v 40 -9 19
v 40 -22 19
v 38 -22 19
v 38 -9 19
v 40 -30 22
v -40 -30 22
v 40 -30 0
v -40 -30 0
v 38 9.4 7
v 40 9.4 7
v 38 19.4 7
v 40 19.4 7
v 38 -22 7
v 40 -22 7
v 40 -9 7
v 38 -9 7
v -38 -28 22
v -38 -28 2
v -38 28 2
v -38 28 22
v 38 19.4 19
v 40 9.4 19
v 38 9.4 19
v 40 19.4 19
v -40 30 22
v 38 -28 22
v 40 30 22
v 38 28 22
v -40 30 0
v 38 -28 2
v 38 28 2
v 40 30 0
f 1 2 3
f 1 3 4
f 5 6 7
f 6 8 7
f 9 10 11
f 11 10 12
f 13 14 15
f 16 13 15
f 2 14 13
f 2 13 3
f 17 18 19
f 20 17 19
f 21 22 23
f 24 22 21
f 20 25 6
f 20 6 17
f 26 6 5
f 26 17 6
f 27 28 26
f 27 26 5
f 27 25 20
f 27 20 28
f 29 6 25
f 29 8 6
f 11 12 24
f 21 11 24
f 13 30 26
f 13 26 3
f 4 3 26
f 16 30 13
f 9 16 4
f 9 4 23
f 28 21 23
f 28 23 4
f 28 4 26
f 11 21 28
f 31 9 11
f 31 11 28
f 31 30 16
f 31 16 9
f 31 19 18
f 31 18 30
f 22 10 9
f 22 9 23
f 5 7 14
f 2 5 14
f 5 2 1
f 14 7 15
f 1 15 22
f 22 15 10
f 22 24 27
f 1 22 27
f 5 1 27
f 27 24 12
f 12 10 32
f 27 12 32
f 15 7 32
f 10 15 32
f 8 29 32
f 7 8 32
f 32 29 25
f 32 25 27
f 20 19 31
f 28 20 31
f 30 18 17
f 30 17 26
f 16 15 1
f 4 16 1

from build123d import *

# Parameters (mm, degrees)
F0_W     = 80
F0_H     = 60
F1_DEPTH = 2
F2_W     = 80
F2_H     = 60
F2_W_2   = 76
F2_H_2   = 56
F3_DEPTH = 20
F4_W     = 13
F4_H     = 12
F4_W_2   = 10
F5_DEPTH = 2


# Not quite as in the source:
# - the program builds the solid bodies; features that only make, move or delete a surface that nothing else refers to are left out


with BuildPart() as f1:
    # F0 (on Top) → F1 (new body)
    with BuildSketch(Plane.XY):
        Rectangle(F0_W, F0_H)
    extrude(amount=F1_DEPTH)

    # F2 (on face) → F3 (join)
    with BuildSketch(Plane.XY.offset(2)):
        Rectangle(F2_W, F2_H)
        Rectangle(F2_W_2, F2_H_2, mode=Mode.SUBTRACT)
    extrude(amount=F3_DEPTH)

    # F4 (on face) → F5 (cut)
    with BuildSketch(Plane.YZ.offset(40)):
        with Locations((-15.5, 13)):
            Rectangle(F4_W, F4_H)
        with Locations((14.4, 13)):
            Rectangle(F4_W_2, F4_H)
    extrude(amount=-F5_DEPTH, mode=Mode.SUBTRACT)


solid = f1.part
